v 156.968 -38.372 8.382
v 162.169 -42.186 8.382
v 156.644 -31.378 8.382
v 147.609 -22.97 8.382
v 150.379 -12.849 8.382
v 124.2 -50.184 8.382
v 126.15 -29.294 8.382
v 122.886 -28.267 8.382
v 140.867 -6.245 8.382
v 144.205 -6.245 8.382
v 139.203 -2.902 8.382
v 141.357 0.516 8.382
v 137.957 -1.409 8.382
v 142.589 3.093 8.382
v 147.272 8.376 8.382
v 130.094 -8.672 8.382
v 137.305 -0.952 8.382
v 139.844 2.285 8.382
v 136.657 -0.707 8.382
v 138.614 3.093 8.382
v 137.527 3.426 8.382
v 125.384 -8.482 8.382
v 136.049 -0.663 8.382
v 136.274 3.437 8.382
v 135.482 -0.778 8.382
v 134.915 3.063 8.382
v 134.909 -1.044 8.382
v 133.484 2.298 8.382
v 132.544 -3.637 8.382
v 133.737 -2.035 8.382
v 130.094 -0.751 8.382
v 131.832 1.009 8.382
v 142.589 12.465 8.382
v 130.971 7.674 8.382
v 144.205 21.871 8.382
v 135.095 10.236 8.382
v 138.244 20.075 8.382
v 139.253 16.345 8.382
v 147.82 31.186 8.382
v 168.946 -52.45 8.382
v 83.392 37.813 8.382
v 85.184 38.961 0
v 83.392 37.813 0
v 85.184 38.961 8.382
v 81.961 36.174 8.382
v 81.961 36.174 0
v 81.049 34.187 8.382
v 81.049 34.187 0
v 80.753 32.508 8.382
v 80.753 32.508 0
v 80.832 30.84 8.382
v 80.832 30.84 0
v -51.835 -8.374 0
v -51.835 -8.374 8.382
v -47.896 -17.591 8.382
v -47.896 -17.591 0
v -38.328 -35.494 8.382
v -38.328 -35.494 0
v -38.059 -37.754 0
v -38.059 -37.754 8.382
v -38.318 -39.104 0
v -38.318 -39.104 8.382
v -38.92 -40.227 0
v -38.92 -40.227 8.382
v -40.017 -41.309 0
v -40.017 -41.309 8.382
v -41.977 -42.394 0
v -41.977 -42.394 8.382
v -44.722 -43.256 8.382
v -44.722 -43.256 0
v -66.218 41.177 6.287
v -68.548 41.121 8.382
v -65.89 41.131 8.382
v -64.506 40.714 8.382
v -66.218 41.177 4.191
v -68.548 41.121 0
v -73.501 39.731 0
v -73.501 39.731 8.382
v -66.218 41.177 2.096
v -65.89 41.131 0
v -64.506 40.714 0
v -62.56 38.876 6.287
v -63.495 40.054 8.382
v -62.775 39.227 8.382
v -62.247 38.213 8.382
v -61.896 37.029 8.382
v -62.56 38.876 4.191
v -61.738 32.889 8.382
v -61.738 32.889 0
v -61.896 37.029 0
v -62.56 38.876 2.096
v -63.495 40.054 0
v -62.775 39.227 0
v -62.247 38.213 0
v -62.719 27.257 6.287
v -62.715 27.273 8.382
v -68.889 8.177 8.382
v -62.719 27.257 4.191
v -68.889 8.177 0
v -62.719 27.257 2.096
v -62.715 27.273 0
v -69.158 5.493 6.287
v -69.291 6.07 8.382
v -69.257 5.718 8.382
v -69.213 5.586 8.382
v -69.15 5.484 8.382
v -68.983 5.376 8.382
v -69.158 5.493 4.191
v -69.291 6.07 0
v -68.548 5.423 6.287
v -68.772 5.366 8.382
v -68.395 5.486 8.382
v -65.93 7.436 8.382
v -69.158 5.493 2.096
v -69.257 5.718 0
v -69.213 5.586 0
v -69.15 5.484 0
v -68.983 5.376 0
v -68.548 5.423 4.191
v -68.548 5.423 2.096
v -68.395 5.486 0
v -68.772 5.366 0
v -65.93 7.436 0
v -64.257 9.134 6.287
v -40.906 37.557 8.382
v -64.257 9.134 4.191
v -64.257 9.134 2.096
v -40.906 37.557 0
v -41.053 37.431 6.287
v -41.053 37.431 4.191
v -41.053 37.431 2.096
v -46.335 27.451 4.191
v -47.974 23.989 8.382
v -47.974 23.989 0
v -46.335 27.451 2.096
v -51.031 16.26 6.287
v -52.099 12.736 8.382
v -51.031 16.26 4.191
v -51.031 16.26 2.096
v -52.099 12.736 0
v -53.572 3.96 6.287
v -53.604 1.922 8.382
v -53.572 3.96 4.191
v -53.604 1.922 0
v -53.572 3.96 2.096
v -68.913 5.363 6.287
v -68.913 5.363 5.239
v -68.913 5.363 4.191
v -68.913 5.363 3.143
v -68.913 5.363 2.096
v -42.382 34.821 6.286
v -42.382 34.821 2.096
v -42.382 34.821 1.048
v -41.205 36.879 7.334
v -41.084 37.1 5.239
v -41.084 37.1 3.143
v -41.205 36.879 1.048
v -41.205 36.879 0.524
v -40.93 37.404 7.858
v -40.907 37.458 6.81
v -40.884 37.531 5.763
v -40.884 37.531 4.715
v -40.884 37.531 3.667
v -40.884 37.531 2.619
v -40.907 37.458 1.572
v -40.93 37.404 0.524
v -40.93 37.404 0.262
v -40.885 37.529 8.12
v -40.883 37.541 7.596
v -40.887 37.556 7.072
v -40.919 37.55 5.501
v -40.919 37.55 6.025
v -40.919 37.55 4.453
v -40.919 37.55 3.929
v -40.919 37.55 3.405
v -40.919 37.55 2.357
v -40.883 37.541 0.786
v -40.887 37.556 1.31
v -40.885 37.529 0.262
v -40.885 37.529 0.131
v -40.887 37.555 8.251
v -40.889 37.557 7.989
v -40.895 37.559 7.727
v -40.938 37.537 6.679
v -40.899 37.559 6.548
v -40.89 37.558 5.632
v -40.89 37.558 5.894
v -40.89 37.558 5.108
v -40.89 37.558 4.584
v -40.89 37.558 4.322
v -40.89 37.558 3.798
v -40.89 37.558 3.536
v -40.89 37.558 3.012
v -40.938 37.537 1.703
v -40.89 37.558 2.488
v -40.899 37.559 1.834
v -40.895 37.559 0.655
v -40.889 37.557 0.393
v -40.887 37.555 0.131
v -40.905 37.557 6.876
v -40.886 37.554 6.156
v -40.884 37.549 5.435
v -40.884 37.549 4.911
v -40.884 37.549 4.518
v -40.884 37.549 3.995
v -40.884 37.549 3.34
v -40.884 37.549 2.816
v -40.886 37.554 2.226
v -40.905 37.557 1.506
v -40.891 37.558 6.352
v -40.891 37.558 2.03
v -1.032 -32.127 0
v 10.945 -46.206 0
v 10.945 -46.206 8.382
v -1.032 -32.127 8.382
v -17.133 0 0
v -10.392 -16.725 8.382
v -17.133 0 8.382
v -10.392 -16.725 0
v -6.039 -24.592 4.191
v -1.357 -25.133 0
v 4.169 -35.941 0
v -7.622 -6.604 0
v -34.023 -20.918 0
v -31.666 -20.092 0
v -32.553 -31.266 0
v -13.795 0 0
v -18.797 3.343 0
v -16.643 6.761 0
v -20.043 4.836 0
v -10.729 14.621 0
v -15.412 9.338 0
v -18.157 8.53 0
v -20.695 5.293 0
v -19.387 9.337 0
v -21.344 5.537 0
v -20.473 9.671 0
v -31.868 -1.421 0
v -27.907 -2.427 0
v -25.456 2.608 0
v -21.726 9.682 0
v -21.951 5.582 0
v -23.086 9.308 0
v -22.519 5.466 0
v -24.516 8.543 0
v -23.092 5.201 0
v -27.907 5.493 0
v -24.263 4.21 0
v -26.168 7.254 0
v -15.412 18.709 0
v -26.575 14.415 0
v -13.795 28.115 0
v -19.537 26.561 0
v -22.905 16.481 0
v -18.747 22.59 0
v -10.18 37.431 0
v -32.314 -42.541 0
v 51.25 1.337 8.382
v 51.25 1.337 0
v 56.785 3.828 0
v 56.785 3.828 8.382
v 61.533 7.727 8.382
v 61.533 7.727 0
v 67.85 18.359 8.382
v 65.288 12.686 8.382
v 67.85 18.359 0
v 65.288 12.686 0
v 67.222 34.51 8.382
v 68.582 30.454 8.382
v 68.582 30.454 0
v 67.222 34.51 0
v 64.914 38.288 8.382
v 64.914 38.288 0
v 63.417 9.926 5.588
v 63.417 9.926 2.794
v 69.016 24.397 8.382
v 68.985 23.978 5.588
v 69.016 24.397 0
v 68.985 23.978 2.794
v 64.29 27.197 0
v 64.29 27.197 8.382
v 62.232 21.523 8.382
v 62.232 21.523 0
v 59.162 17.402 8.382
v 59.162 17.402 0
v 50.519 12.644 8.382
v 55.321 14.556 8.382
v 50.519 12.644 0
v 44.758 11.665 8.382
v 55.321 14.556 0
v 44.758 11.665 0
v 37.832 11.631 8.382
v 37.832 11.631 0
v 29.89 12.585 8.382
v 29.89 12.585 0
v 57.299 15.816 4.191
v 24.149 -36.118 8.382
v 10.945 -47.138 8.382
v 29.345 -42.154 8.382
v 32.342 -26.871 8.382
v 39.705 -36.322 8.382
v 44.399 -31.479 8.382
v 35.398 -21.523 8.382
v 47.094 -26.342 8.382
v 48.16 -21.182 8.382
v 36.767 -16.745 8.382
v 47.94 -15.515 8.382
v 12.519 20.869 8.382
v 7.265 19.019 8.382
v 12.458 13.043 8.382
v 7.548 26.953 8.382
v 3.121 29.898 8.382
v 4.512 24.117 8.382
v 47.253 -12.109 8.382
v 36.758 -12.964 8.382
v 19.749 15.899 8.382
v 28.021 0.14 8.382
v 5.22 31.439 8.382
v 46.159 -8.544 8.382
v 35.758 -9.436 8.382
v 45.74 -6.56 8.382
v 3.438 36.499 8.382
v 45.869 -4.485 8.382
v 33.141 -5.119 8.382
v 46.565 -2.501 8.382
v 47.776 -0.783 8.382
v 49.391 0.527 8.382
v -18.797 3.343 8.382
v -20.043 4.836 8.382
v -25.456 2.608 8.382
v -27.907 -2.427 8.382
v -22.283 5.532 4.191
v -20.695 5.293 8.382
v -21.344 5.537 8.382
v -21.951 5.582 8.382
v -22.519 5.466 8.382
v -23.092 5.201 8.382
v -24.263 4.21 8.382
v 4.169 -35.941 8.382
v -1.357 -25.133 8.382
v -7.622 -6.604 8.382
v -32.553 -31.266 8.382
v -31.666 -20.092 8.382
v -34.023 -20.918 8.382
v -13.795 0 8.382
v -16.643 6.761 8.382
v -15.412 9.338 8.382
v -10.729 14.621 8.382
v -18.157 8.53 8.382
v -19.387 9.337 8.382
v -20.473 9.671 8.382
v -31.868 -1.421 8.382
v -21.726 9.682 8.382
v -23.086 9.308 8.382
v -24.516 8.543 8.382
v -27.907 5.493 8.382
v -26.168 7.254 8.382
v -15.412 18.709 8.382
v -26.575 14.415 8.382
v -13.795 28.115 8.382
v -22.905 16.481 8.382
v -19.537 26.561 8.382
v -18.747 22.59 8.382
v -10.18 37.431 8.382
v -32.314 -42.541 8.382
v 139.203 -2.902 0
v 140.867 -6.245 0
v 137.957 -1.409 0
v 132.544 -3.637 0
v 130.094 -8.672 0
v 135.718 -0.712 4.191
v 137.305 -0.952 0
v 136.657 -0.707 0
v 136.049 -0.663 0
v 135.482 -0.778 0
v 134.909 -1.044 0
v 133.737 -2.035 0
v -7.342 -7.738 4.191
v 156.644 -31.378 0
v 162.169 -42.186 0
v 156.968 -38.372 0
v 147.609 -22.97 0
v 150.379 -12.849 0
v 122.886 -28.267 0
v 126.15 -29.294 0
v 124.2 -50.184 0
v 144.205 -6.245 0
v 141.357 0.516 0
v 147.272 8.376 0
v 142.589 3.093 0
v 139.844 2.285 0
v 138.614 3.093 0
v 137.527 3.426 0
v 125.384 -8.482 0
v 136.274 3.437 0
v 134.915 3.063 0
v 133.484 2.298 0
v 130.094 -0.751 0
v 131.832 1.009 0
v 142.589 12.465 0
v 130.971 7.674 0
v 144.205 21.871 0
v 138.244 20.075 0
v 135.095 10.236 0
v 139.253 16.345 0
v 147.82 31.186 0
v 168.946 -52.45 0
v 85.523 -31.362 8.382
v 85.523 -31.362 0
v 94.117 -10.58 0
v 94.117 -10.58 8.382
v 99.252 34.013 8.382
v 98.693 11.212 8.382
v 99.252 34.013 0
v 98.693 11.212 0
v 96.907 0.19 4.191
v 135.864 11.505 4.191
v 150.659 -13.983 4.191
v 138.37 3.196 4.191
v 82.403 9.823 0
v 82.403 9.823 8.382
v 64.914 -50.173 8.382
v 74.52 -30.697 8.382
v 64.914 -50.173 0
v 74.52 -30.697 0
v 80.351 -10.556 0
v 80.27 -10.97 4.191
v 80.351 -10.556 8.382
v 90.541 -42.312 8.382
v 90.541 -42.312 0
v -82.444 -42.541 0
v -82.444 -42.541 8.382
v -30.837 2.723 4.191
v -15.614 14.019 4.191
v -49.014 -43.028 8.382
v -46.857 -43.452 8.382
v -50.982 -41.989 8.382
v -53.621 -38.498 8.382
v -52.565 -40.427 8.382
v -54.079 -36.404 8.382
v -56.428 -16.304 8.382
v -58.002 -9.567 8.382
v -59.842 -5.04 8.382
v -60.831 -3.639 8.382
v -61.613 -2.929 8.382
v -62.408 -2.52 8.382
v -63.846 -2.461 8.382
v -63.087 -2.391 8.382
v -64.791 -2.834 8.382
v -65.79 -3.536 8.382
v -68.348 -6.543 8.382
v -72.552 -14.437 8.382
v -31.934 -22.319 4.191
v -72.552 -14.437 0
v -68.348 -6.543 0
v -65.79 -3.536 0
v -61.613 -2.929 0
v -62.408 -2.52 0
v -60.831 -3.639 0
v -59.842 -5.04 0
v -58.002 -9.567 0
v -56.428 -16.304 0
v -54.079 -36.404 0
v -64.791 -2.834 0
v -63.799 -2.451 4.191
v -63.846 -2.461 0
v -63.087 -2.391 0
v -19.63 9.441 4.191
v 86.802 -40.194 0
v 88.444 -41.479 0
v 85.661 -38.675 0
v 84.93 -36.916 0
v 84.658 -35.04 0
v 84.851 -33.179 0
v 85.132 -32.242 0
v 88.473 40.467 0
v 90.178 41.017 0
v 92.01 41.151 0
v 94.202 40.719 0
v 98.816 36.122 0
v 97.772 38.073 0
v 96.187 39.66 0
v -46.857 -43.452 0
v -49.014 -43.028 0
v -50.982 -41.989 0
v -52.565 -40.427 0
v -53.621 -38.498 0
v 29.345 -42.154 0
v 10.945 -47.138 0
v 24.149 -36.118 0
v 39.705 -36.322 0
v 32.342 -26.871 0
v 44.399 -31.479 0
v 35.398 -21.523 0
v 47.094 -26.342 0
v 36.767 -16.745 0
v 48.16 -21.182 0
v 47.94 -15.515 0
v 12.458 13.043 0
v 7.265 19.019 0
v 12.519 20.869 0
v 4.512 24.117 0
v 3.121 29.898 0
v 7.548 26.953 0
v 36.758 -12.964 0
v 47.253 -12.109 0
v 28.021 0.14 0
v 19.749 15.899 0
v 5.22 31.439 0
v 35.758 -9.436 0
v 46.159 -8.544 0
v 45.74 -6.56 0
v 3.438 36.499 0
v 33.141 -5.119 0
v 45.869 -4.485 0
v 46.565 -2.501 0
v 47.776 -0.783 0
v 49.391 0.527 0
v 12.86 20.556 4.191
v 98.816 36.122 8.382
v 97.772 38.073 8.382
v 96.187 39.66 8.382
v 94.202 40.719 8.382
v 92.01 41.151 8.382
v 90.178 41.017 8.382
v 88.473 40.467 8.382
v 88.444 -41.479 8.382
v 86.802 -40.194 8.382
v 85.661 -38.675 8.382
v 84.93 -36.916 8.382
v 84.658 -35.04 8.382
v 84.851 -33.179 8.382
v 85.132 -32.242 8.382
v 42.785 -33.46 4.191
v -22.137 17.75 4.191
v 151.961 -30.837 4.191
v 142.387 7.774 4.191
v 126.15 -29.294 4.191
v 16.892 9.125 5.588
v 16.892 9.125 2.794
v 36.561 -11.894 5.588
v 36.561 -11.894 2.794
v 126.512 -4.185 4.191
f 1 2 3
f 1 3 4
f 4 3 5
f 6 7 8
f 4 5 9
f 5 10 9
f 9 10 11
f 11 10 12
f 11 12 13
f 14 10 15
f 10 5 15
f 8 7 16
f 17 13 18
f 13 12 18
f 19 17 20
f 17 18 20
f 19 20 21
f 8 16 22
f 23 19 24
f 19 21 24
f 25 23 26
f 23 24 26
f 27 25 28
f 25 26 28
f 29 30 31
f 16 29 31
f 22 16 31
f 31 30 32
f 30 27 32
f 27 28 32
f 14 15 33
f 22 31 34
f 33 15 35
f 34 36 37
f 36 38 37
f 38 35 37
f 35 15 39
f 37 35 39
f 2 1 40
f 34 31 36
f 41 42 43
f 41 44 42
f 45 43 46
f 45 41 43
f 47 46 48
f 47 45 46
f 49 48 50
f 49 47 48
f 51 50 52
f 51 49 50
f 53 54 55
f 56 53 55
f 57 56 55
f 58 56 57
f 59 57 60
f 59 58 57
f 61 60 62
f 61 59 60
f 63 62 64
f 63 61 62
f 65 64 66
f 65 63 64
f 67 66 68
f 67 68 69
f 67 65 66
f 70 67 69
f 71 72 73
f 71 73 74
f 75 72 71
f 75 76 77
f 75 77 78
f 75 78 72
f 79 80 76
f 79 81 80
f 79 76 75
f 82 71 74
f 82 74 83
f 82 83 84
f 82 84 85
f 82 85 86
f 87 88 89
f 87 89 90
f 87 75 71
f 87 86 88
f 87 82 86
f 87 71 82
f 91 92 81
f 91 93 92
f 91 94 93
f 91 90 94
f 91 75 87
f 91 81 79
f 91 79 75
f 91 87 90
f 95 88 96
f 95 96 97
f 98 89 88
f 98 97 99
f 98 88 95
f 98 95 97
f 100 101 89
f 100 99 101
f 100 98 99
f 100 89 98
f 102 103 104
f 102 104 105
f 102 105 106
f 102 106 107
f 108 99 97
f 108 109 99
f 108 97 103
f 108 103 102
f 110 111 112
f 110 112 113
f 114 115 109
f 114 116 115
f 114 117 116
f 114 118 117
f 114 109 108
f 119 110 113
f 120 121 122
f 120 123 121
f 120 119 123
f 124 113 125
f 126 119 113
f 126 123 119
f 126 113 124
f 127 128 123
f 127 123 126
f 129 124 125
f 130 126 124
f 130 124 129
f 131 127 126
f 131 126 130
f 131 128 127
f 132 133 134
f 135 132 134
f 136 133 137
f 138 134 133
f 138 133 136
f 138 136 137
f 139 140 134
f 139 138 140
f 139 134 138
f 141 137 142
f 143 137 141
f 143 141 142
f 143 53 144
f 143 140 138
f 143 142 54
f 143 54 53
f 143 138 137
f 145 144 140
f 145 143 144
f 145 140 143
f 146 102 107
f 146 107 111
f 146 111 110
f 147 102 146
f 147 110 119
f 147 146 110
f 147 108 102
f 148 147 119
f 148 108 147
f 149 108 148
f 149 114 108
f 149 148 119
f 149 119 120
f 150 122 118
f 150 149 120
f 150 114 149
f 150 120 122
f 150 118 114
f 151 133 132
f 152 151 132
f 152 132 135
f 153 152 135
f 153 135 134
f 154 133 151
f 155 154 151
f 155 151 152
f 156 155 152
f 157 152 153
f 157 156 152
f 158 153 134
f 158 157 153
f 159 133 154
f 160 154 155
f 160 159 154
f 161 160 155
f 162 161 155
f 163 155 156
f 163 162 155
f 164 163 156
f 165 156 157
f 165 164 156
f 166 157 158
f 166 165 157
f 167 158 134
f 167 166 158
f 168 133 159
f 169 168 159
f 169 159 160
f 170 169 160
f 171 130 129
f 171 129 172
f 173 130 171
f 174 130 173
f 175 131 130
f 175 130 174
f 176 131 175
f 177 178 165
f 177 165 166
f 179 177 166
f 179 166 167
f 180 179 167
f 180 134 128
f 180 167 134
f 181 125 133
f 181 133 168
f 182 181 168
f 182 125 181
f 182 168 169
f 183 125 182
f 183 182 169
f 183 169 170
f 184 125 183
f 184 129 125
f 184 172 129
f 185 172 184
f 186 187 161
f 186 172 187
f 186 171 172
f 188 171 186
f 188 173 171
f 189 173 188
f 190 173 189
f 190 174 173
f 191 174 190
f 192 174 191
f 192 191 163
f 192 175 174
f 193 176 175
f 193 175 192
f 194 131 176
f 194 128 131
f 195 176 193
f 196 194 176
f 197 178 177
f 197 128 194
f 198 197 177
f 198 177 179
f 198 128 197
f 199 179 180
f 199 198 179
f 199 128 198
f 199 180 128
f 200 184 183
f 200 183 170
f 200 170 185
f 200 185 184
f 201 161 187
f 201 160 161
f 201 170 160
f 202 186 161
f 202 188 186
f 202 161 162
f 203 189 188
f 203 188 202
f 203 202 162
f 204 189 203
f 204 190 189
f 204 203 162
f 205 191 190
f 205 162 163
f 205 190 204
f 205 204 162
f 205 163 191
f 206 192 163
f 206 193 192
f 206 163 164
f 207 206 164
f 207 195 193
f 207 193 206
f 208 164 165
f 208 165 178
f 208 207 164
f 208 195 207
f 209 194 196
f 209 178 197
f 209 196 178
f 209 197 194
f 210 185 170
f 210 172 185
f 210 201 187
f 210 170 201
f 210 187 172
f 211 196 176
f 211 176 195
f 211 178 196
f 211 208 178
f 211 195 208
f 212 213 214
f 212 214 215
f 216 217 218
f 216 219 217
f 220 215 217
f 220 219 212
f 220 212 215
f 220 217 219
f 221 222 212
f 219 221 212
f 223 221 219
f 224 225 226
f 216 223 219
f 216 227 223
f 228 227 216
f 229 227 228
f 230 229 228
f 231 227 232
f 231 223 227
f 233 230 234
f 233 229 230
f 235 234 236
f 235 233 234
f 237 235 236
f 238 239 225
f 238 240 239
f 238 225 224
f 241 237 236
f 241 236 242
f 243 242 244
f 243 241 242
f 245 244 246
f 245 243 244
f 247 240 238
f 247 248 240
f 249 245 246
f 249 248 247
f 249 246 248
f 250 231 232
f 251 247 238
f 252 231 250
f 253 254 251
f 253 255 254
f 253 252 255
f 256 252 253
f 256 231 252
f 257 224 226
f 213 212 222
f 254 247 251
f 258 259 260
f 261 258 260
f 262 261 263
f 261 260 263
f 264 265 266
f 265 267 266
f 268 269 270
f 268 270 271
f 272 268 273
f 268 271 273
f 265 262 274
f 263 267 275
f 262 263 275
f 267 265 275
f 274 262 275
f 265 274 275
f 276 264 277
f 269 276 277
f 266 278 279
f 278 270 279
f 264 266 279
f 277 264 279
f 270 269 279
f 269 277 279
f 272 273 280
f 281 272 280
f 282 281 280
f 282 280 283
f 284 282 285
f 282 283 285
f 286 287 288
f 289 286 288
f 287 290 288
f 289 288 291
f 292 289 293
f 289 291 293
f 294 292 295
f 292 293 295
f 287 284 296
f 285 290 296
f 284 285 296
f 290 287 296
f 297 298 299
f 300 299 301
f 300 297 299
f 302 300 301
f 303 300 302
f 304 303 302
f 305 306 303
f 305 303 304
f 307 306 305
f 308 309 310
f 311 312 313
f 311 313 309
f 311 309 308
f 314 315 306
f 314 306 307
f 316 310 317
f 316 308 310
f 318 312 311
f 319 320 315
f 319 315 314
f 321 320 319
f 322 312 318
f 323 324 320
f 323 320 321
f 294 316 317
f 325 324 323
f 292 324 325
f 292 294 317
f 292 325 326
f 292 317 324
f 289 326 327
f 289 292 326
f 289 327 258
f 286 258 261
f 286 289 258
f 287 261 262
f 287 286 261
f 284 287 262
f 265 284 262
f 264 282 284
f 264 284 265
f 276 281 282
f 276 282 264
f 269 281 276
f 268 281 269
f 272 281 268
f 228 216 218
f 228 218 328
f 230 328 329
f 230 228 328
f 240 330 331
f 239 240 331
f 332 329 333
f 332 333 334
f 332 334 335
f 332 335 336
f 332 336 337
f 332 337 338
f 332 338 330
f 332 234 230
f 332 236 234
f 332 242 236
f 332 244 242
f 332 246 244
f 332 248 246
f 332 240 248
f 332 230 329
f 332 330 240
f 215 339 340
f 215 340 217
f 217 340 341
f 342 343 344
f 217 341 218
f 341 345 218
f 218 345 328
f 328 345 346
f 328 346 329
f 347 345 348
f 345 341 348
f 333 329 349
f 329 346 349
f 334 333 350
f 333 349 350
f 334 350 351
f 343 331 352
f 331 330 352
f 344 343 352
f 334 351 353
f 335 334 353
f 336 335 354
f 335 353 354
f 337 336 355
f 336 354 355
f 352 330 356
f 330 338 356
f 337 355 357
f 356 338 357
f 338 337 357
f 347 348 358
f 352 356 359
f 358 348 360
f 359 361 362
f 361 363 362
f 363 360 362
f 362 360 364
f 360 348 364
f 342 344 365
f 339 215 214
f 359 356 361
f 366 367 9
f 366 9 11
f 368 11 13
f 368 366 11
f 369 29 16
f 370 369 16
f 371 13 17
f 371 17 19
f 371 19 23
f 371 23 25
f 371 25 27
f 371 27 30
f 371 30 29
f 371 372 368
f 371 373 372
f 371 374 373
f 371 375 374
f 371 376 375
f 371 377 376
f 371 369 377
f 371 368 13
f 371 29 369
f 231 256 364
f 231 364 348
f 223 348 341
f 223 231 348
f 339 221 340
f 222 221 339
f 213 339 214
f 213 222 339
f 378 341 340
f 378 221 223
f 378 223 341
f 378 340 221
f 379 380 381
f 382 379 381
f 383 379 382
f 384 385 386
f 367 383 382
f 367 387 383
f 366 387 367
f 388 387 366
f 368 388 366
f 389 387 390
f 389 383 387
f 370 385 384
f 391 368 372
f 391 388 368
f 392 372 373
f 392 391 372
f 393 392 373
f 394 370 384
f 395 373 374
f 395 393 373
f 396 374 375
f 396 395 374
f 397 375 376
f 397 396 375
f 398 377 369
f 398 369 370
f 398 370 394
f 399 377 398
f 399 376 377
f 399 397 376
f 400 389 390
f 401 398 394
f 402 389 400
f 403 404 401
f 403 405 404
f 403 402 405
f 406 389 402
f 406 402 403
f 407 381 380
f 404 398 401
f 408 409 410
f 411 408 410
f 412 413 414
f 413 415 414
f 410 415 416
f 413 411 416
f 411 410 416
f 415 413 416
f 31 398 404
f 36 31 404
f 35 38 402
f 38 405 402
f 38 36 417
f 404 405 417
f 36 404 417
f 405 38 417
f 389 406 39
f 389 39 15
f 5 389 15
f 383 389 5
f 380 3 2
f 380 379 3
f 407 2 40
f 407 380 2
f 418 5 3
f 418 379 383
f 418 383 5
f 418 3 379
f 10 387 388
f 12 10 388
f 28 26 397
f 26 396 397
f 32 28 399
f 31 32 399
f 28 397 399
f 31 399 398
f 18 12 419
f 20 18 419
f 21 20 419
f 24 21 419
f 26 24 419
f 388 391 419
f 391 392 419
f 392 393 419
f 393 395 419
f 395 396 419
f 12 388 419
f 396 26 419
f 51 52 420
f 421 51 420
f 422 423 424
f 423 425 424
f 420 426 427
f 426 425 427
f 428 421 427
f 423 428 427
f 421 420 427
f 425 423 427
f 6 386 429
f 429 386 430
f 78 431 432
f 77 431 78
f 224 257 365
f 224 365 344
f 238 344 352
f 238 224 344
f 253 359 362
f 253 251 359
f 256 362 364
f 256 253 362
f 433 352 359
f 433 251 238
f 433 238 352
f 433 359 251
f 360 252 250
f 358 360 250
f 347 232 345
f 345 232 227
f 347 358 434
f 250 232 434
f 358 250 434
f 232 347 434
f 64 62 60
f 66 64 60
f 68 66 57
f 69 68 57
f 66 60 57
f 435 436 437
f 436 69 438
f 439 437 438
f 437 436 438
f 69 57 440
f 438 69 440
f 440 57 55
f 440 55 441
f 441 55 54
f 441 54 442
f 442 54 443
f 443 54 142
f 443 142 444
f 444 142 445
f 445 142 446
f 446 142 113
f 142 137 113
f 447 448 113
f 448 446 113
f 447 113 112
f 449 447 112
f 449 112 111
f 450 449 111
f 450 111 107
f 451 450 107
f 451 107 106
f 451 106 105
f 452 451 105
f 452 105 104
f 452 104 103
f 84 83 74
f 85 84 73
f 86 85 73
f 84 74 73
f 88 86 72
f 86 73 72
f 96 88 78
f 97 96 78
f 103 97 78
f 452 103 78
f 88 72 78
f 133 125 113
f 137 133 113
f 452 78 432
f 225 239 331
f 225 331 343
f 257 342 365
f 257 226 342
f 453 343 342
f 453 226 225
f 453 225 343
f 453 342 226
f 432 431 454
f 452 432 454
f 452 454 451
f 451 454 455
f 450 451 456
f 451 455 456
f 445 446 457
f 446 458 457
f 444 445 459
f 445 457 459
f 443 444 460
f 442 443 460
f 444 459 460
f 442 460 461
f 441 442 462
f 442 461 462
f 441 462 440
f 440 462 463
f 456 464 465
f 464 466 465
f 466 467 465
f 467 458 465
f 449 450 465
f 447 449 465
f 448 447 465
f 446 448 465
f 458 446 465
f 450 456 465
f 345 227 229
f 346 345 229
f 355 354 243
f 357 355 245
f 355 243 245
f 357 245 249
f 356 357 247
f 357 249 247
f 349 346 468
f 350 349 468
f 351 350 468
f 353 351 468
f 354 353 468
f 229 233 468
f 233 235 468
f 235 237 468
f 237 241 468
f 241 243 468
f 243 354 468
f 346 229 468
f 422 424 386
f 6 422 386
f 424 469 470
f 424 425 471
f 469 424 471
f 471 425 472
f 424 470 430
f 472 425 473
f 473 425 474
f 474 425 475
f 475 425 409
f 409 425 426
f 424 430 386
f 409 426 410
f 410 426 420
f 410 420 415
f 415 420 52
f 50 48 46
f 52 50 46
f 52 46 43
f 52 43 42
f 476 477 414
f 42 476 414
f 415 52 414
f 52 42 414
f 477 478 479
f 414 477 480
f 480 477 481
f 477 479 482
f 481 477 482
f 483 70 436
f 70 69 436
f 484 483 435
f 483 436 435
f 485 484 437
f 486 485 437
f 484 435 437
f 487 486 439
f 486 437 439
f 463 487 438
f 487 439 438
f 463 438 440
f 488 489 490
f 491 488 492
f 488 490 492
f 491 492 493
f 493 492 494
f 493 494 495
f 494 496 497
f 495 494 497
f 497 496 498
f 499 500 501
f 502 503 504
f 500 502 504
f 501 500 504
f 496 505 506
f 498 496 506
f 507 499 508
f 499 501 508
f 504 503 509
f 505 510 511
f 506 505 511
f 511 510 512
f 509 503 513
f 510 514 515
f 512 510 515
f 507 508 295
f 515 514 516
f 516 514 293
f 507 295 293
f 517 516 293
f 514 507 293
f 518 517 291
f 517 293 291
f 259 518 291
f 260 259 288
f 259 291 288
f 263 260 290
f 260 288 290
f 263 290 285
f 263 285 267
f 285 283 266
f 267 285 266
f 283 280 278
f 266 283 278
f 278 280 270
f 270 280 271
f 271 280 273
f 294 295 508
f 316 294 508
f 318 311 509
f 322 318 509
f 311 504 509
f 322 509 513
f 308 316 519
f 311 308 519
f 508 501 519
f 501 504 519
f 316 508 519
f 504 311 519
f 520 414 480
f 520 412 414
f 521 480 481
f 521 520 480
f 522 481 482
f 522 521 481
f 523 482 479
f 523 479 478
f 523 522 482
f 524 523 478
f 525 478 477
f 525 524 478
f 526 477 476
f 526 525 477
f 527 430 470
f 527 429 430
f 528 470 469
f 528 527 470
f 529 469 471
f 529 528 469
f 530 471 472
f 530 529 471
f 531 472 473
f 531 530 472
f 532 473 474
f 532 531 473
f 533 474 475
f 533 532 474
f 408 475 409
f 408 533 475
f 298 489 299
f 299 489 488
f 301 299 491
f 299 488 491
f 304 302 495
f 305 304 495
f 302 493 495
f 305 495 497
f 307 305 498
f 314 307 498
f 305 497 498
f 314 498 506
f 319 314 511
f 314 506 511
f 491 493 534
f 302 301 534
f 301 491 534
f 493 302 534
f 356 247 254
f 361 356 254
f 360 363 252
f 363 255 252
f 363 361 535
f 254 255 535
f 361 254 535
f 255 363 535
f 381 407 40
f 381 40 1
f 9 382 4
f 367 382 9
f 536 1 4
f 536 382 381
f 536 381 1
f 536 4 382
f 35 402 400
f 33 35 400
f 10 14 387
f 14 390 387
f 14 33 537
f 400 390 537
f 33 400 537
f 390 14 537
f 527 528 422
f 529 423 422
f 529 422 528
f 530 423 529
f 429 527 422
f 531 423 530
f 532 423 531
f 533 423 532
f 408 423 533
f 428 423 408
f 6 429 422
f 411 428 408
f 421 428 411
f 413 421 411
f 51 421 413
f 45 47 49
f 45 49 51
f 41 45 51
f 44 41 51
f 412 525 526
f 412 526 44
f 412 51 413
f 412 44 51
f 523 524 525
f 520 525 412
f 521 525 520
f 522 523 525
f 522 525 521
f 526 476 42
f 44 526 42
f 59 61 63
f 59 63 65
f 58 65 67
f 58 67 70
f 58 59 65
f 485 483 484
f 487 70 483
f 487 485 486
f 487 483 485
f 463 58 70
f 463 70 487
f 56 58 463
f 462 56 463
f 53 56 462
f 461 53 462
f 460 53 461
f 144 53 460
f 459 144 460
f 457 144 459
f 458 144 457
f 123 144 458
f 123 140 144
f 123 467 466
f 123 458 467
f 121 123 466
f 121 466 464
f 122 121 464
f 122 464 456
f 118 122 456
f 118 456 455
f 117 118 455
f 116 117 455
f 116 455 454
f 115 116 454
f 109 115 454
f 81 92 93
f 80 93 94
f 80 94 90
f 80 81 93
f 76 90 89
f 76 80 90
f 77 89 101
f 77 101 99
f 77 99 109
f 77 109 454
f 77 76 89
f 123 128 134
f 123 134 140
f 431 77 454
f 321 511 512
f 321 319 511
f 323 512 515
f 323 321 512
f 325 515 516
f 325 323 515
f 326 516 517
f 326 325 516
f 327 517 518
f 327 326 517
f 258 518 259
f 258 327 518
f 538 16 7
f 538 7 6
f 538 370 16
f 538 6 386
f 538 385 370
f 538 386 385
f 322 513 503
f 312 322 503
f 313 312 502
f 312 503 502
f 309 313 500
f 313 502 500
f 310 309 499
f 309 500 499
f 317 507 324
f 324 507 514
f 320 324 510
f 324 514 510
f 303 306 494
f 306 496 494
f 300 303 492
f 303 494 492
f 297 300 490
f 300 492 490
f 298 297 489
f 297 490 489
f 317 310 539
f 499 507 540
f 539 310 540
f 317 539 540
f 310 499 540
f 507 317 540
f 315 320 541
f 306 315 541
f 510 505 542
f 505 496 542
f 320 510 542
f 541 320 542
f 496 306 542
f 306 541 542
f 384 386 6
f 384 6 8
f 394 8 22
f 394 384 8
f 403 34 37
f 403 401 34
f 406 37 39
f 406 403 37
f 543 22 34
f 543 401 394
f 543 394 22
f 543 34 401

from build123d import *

# Parameters (mm, degrees)
BOSS_EXTRUDE7_DEPTH   = 8.382
BOSS_EXTRUDE7_2_DEPTH = 8.382
BOSS_EXTRUDE7_3_DEPTH = 8.382
BOSS_EXTRUDE7_4_DEPTH = 8.382
BOSS_EXTRUDE7_5_DEPTH = 8.382
FILLET1_R             = 7.62
FILLET2_R             = 7.62
FILLET3_R             = 7.62


with BuildPart() as part:
    # Sketch1 → Boss-Extrude7 (new body)
    with BuildSketch(Plane.XY):
        with BuildLine():
            add(Edge.make_bspline(
                [(80.593985758, -39.986212348), (104.590491263, -1.36618624), (98.15161207, 44.90200856)],
                knots=[0, 0, 0, 1, 1, 1], degree=2))
            Line((98.15161207, 44.90200856), (79.812036694, 36.499144996))
            add(Edge.make_bspline(
                [(79.812036694, 36.499144996), (89.154447315, -9.795856584), (64.913873917, -50.1734664)],
                knots=[0, 0, 0, 1, 1, 1], degree=2))
            Line((64.913873917, -50.1734664), (124.199759198, -50.183766386))
            Line((124.199759198, -50.183766386), (80.593985758, -39.986212348))
        make_face()
    extrude(amount=BOSS_EXTRUDE7_DEPTH)

    # Fillet1
    fillet1_edges = [part.edges().sort_by_distance(p)[0] for p in [
        (80.593985758, -39.986212348, 4.191),
        (79.812036694, 36.499144996, 4.191),
        (98.15161207, 44.90200856, 4.191),
    ]]
    fillet(fillet1_edges, radius=FILLET1_R)


with BuildPart() as body_2:
    # Sketch1 → Boss-Extrude7 2 (new body)
    with BuildSketch(Plane.XY):
        with BuildLine():
            add(Edge.make_bspline(
                [(124.199759198, -50.183766386), (117.012925983, 1.129181269), (147.820432676, 31.186409083)],
                knots=[0, 0, 0, 1, 1, 1], degree=2))
            add(Edge.make_bspline(
                [(130.094029688, -8.672052455), (125.153114682, -29.161062657), (124.199759198, -50.183766386)],
                knots=[0, 0, 0, 1, 1, 1], degree=2))
            add(Edge.make_bspline(
                [(140.867171715, -6.244774349), (135.954892962, 6.033440127), (130.094029688, -8.672052455)],
                knots=[0, 0, 0, 1, 1, 1], degree=2))
            add(Edge.make_bspline(
                [(168.945677423, -52.450314734), (149.01592665, -32.325741622), (140.867171715, -6.244774349)],
                knots=[0, 0, 0, 1, 1, 1], degree=2))
            add(Edge.make_bspline(
                [(147.820432676, 31.186409083), (142.934936535, -17.333599118), (168.945677423, -52.450314734)],
                knots=[0, 0, 0, 1, 1, 1], degree=2))
        make_face()
        with BuildLine():
            add(Edge.make_bspline(
                [(144.205094278, 21.870592822), (140.568342388, 7.735944588), (144.205095137, -6.244774401)],
                knots=[0, 0, 0, 1, 1, 1], degree=2))
            add(Edge.make_bspline(
                [(144.205095137, -6.244774401), (139.590870199, 9.890356254), (130.094029961, -0.751460023)],
                knots=[0, 0, 0, 1, 1, 1], degree=2))
            add(Edge.make_bspline(
                [(130.094029961, -0.751460023), (134.577438531, 12.450294456), (144.205094278, 21.870592822)],
                knots=[0, 0, 0, 1, 1, 1], degree=2))
        make_face(mode=Mode.SUBTRACT)
    extrude(amount=BOSS_EXTRUDE7_2_DEPTH)


with BuildPart() as body_3:
    # Sketch1 → Boss-Extrude7 3 (new body)
    with BuildSketch(Plane.XY):
        with BuildLine():
            add(Edge.make_bspline(
                [(-73.501404724, 39.730710138), (-48.4925566, 49.519454353), (-92.646020123, -31.016507841), (-23.071407093, 62.195978495), (-76.266965034, -13.16034631), (-17.987425724, -42.603241217), (-53.572173938, -44.329763315)],
                knots=[0, 0, 0, 0, 0.243395444, 0.47314994, 0.666139964, 1, 1, 1, 1], degree=3))
            Line((-73.501404724, 39.730710138), (-82.444007756, -42.541242581))
            add(Edge.make_bspline(
                [(-82.444007756, -42.541242581), (-58.114713757, 38.651120963), (-53.572173938, -44.329763315)],
                knots=[0, 0, 0, 1, 1, 1], degree=2))
        make_face()
    extrude(amount=BOSS_EXTRUDE7_3_DEPTH)

    # Fillet3
    fillet3_edges = [body_3.edges().sort_by_distance(p)[0] for p in [
        (-53.572173938, -44.329763315, 4.191),
    ]]
    fillet(fillet3_edges, radius=FILLET3_R)


with BuildPart() as body_4:
    # Sketch1 → Boss-Extrude7 4 (new body)
    with BuildSketch(Plane.XY):
        with BuildLine():
            add(Edge.make_bspline(
                [(-32.314181698, -42.541242543), (-40.426407552, 8.00029759), (-10.180115619, 37.43118326)],
                knots=[0, 0, 0, 1, 1, 1], degree=2))
            add(Edge.make_bspline(
                [(-27.906518833, -2.427278118), (-33.756676706, -22.153382102), (-32.314181698, -42.541242543)],
                knots=[0, 0, 0, 1, 1, 1], degree=2))
            add(Edge.make_bspline(
                [(-17.133376776, -1.24e-07), (-22.045655474, 12.278214596), (-27.906518833, -2.427278118)],
                knots=[0, 0, 0, 1, 1, 1], degree=2))
            add(Edge.make_bspline(
                [(10.945127821, -46.205541186), (-8.98462146, -26.080967176), (-17.133376776, -1.24e-07)],
                knots=[0, 0, 0, 1, 1, 1], degree=2))
            add(Edge.make_bspline(
                [(-10.180115619, 37.43118326), (-15.065602355, -11.08881845), (10.945127821, -46.205541186)],
                knots=[0, 0, 0, 1, 1, 1], degree=2))
        make_face()
        with BuildLine():
            add(Edge.make_bspline(
                [(-13.795454223, 28.115367177), (-17.432206261, 13.980718755), (-13.795453156, -3.62e-07)],
                knots=[0, 0, 0, 1, 1, 1], degree=2))
            add(Edge.make_bspline(
                [(-13.795453156, -3.62e-07), (-18.409678263, 16.13513086), (-27.906518828, 5.49331412)],
                knots=[0, 0, 0, 1, 1, 1], degree=2))
            add(Edge.make_bspline(
                [(-27.906518828, 5.49331412), (-23.42310895, 18.695067722), (-13.795454223, 28.115367177)],
                knots=[0, 0, 0, 1, 1, 1], degree=2))
        make_face(mode=Mode.SUBTRACT)
    extrude(amount=BOSS_EXTRUDE7_4_DEPTH)


with BuildPart() as body_5:
    # Sketch1 → Boss-Extrude7 5 (new body)
    with BuildSketch(Plane.XY):
        with BuildLine():
            add(Edge.make_bspline(
                [(29.890111286, 12.585029407), (9.05672741, 16.569741522), (3.43831823, 36.499146501)],
                knots=[0, 0, 0, 1, 1, 1], degree=2))
            add(Edge.make_bspline(
                [(3.43831823, 36.499146501), (-3.380877769, -0.911289563), (76.36846317, 2.076687962), (10.945127821, -47.137578729)],
                knots=[0, 0, 0, 0, 1, 1, 1, 1], degree=3))
            add(Edge.make_bspline(
                [(10.945127821, -47.137578729), (63.881678361, -37.878265116), (41.659633188, 1.054169954)],
                knots=[0, 0, 0, 1, 1, 1], degree=2))
            add(Edge.make_bspline(
                [(41.659633188, 1.054169954), (61.09208277, -3.235841598), (76.876091958, 22.943979497), (64.91387385, 38.287667017)],
                knots=[0, 0, 0, 0, 1, 1, 1, 1], degree=3))
            add(Edge.make_bspline(
                [(64.91387385, 38.287667017), (67.195593198, 6.196084158), (29.890111286, 12.585029407)],
                knots=[0, 0, 0, 1, 1, 1], degree=2))
        make_face()
    extrude(amount=BOSS_EXTRUDE7_5_DEPTH)

    # Fillet2
    fillet2_edges = [body_5.edges().sort_by_distance(p)[0] for p in [
        (41.659633188, 1.054169954, 4.191),
    ]]
    fillet(fillet2_edges, radius=FILLET2_R)


solid = Compound([part.part, body_2.part, body_3.part, body_4.part, body_5.part])
